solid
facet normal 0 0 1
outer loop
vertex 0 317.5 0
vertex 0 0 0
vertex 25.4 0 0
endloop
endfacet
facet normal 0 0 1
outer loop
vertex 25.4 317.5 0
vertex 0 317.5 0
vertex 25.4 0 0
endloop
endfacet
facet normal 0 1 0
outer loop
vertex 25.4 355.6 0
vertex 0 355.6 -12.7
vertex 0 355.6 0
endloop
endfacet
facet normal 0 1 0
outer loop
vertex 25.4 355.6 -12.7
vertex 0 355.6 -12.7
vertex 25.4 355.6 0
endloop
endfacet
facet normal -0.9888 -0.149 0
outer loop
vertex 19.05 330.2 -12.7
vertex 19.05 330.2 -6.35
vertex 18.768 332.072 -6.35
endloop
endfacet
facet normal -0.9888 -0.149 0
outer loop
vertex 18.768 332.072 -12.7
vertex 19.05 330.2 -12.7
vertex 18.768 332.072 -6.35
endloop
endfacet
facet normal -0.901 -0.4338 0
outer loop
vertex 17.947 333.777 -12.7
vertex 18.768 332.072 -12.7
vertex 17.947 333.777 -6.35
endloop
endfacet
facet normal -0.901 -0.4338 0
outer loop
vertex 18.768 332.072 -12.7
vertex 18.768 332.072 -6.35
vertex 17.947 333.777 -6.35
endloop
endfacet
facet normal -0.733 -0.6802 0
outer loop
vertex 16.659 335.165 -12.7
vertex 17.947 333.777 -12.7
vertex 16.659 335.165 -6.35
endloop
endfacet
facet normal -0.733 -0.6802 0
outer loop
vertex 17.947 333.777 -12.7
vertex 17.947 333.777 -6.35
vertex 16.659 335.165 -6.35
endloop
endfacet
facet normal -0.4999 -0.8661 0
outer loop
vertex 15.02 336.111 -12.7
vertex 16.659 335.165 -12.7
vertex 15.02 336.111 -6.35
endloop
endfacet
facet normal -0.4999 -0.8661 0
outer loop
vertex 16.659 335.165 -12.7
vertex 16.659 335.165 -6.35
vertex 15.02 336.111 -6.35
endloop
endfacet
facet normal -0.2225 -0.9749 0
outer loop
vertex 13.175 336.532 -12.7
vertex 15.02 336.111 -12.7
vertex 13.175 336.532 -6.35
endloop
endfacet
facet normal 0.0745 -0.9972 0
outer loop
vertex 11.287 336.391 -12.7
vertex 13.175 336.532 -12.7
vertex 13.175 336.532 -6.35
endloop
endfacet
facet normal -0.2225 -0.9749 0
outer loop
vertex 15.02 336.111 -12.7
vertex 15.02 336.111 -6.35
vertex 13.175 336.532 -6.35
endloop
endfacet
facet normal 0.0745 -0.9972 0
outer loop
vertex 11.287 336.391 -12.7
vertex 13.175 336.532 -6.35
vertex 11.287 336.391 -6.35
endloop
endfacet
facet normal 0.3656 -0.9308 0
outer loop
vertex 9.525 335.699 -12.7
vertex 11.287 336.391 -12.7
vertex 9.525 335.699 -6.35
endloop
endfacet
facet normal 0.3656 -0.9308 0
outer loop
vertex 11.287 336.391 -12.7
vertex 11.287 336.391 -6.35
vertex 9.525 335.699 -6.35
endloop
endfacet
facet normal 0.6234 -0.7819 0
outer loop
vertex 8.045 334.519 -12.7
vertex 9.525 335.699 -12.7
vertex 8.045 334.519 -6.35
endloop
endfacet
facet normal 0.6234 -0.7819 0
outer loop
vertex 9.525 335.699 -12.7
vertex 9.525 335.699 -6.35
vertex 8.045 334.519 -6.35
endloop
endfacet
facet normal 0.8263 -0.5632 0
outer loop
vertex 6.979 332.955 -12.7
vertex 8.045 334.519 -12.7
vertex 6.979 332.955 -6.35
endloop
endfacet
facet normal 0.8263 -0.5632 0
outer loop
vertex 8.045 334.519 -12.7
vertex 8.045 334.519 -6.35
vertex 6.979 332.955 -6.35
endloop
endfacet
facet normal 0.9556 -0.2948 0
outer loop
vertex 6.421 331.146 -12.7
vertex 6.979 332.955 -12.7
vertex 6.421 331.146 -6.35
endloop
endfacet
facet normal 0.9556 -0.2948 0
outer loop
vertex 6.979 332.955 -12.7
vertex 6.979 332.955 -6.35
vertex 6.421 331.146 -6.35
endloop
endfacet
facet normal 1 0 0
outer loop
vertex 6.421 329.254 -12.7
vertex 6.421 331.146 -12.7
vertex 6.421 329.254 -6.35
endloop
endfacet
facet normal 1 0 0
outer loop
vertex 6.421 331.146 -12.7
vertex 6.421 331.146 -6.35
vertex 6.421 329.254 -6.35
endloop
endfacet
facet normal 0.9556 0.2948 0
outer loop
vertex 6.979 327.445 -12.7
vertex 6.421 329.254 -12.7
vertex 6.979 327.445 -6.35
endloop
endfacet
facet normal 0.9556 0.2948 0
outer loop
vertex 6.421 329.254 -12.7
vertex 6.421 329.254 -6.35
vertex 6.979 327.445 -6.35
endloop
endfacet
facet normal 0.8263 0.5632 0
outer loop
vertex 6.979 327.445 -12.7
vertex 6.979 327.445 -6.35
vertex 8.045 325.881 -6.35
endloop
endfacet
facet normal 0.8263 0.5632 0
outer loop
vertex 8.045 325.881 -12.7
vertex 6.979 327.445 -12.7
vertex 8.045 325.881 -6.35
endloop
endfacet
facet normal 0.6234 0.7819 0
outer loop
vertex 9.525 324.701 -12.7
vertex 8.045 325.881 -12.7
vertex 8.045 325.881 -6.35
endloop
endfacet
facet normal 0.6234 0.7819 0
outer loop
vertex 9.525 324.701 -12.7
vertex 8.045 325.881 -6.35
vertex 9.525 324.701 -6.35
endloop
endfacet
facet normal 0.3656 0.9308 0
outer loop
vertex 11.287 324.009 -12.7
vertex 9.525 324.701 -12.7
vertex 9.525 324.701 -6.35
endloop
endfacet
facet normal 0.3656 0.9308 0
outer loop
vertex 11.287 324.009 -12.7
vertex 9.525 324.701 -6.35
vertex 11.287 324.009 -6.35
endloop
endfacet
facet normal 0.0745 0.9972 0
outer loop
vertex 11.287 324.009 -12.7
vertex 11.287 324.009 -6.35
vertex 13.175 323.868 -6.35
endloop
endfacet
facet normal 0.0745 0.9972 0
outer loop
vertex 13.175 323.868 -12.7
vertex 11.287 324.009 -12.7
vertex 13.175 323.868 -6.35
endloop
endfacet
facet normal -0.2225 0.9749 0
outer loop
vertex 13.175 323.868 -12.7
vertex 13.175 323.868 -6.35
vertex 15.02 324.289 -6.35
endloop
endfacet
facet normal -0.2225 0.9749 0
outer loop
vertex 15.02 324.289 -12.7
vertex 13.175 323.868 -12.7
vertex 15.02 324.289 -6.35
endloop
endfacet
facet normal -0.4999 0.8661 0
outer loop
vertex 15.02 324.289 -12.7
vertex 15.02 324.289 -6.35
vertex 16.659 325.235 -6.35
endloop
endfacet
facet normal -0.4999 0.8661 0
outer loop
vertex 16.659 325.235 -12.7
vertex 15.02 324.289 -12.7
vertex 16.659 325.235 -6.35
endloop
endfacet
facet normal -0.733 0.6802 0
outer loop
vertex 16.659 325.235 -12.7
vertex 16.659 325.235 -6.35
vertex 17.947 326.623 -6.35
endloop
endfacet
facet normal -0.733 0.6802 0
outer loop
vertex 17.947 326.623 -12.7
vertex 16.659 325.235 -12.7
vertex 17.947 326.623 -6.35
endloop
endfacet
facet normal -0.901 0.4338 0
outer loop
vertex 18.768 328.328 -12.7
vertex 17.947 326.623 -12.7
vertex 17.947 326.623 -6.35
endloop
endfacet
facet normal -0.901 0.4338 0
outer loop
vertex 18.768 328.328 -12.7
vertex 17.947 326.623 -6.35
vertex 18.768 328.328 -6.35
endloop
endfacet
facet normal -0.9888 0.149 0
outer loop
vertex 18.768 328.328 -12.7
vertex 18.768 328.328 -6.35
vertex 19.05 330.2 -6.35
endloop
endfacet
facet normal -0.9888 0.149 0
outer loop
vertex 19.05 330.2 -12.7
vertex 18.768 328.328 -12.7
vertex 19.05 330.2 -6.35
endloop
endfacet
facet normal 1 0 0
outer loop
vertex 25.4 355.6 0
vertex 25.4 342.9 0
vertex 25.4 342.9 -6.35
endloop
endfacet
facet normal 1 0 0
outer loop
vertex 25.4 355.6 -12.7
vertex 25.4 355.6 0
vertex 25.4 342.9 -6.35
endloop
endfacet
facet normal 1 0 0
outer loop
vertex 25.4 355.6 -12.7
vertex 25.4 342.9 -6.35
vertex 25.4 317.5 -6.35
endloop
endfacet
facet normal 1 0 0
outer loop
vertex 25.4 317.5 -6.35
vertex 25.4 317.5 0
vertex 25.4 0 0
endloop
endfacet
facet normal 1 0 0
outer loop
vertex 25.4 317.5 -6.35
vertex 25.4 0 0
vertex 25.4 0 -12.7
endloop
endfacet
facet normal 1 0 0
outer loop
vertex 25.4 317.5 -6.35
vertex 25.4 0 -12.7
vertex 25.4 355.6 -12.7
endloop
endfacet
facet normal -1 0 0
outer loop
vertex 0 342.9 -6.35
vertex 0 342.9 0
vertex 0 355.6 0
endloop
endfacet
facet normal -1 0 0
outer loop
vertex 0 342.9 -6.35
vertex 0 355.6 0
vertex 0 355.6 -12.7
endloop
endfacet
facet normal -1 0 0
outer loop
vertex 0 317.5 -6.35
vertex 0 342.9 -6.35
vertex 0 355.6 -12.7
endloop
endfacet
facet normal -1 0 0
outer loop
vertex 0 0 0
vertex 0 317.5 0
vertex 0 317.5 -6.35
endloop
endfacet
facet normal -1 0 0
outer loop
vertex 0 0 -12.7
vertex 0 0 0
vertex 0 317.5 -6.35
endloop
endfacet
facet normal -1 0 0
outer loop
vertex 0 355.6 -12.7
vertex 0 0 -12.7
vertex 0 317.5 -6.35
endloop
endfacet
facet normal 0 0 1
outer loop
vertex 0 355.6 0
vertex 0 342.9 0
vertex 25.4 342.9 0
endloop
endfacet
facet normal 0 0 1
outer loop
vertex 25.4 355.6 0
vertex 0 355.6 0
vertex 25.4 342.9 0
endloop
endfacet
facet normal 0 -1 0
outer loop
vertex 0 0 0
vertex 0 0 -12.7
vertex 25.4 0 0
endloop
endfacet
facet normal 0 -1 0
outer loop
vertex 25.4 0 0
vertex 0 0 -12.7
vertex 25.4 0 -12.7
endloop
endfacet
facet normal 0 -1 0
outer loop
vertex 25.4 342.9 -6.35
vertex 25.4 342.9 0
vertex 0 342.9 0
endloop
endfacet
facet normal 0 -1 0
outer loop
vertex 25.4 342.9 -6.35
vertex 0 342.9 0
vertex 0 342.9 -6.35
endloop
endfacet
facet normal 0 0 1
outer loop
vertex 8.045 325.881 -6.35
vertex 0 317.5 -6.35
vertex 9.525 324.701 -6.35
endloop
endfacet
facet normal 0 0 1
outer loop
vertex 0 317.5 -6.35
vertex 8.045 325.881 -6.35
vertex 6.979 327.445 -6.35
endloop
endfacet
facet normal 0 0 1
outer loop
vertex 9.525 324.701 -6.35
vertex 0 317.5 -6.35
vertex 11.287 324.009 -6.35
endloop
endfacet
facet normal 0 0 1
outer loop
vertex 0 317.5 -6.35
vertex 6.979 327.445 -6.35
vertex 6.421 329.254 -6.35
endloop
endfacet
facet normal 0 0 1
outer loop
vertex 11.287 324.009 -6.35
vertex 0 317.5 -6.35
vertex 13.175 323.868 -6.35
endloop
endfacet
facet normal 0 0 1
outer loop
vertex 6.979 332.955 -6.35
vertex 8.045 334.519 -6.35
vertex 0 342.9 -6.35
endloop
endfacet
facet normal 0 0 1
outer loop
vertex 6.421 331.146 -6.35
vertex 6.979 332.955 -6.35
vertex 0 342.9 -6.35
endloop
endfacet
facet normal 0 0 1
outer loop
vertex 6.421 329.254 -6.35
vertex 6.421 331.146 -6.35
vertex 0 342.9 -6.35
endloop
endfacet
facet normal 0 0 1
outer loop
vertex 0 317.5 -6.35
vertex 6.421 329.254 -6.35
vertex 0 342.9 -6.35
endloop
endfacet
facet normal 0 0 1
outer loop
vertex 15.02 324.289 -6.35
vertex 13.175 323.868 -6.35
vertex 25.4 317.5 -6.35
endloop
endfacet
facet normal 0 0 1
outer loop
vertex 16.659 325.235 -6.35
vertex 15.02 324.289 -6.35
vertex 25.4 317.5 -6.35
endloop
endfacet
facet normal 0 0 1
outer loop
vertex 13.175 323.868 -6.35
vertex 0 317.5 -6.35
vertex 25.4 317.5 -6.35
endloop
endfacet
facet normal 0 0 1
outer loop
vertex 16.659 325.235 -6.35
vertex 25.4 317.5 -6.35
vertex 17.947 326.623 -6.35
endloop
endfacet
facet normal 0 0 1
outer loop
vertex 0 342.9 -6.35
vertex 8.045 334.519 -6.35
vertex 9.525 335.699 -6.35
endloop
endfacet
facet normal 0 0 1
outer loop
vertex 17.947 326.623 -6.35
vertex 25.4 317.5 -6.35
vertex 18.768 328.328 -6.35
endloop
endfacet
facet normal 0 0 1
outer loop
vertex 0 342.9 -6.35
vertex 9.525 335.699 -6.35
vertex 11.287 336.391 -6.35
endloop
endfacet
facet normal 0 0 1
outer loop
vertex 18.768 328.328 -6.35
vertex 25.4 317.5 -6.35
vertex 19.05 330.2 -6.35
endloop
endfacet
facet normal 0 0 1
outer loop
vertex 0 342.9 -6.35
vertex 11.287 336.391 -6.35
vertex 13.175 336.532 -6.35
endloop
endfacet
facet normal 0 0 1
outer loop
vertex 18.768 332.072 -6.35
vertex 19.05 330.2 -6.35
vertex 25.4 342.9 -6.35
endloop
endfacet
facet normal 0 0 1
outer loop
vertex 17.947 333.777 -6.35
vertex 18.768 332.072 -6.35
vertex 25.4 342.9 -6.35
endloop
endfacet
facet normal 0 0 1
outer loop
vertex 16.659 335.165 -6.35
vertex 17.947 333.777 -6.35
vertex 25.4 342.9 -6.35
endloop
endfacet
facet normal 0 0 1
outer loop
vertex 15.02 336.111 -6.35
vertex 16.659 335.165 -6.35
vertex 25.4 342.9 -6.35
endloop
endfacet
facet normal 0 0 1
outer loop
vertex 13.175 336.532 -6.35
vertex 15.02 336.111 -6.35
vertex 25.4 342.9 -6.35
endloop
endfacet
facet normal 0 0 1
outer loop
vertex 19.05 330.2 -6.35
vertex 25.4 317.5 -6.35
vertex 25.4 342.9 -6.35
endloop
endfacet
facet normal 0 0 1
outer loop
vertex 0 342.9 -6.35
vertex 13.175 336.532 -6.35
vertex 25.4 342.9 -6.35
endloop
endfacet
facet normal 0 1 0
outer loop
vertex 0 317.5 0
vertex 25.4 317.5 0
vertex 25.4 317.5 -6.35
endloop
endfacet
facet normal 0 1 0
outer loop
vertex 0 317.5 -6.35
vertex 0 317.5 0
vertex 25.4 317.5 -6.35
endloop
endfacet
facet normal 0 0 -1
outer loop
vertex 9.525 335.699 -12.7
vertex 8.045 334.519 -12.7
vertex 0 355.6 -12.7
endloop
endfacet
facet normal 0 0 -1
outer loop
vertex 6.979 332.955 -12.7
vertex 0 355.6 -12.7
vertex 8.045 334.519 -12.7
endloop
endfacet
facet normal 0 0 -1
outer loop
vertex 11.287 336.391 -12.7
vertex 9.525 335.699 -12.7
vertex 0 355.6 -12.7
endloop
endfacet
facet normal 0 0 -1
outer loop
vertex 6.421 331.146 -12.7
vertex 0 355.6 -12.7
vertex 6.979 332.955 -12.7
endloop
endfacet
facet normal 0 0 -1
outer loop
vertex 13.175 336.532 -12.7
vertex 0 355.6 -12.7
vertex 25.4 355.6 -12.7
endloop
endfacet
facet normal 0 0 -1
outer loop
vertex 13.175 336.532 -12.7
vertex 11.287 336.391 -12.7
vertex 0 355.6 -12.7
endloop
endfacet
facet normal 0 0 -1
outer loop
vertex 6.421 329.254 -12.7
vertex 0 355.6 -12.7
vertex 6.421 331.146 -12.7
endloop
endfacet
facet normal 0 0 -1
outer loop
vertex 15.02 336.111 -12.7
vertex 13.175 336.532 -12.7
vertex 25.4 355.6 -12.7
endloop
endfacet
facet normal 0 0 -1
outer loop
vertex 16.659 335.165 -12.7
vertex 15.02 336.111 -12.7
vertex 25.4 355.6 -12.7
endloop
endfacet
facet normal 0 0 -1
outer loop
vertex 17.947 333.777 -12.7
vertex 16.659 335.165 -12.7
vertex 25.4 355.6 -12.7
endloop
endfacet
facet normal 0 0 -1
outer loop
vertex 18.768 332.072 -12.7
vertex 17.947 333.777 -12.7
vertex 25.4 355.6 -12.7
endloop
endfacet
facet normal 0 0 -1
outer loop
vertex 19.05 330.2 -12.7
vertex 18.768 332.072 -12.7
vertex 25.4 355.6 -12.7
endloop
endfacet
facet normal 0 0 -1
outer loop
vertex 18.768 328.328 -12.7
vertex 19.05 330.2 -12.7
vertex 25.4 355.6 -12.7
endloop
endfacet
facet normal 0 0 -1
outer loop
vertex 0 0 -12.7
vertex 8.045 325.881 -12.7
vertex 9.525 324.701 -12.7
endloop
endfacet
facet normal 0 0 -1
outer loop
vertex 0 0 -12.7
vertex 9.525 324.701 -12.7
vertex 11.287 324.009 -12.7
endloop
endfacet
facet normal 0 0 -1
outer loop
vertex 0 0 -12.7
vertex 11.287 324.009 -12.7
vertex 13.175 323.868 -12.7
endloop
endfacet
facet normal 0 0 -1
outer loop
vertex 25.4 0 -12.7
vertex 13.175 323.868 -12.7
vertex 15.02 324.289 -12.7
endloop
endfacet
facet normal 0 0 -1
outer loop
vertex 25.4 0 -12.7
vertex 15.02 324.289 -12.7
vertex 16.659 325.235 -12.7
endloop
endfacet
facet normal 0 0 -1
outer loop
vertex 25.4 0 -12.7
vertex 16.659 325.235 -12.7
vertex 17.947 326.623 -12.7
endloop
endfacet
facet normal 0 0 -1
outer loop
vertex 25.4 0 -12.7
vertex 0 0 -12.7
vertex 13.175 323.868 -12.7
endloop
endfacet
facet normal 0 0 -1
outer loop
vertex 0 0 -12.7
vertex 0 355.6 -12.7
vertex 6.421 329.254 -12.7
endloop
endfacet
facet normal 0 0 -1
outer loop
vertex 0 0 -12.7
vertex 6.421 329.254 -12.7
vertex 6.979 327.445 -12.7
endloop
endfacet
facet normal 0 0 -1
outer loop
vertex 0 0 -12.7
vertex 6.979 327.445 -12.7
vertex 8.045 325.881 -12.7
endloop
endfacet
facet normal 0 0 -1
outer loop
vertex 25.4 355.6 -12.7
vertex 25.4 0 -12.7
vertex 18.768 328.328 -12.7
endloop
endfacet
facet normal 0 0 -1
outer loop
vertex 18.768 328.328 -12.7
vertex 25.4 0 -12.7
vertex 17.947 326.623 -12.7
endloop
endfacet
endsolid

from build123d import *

# Parameters (mm, degrees)
SKETCH1_W           = 25.4
SKETCH1_H           = 12.7
BOSS_EXTRUDE1_DEPTH = 355.6
SKETCH2_W           = 6.35
SKETCH2_H           = 25.4
CUT_EXTRUDE1_DEPTH  = 357.732126392
SKETCH3_R           = 6.35
CUT_EXTRUDE2_DEPTH  = 357.562536591


with BuildPart() as part:
    # Sketch1 → Boss-Extrude1 (new body)
    with BuildSketch(Plane(origin=(0, 0, 0), x_dir=(1, 0, 0), z_dir=(0, 1, 0))):
        with Locations((12.7, 6.35)):
            Rectangle(SKETCH1_W, SKETCH1_H)
    extrude(amount=BOSS_EXTRUDE1_DEPTH)

    # Sketch2 → Cut-Extrude1 (cut, through all)
    with BuildSketch(Plane(origin=(25.4, 0, 0), x_dir=(0, 0, -1), z_dir=(1, 0, 0))):
        with Locations((3.175, 330.2)):
            Rectangle(SKETCH2_W, SKETCH2_H)
    extrude(amount=-CUT_EXTRUDE1_DEPTH, mode=Mode.SUBTRACT)

    # Sketch3 → Cut-Extrude2 (cut, through all)
    with BuildSketch(Plane.XY.offset(-6.35)):
        with Locations((12.7, 330.2)):
            Circle(SKETCH3_R)
    extrude(amount=-CUT_EXTRUDE2_DEPTH, mode=Mode.SUBTRACT)


solid = part.part
